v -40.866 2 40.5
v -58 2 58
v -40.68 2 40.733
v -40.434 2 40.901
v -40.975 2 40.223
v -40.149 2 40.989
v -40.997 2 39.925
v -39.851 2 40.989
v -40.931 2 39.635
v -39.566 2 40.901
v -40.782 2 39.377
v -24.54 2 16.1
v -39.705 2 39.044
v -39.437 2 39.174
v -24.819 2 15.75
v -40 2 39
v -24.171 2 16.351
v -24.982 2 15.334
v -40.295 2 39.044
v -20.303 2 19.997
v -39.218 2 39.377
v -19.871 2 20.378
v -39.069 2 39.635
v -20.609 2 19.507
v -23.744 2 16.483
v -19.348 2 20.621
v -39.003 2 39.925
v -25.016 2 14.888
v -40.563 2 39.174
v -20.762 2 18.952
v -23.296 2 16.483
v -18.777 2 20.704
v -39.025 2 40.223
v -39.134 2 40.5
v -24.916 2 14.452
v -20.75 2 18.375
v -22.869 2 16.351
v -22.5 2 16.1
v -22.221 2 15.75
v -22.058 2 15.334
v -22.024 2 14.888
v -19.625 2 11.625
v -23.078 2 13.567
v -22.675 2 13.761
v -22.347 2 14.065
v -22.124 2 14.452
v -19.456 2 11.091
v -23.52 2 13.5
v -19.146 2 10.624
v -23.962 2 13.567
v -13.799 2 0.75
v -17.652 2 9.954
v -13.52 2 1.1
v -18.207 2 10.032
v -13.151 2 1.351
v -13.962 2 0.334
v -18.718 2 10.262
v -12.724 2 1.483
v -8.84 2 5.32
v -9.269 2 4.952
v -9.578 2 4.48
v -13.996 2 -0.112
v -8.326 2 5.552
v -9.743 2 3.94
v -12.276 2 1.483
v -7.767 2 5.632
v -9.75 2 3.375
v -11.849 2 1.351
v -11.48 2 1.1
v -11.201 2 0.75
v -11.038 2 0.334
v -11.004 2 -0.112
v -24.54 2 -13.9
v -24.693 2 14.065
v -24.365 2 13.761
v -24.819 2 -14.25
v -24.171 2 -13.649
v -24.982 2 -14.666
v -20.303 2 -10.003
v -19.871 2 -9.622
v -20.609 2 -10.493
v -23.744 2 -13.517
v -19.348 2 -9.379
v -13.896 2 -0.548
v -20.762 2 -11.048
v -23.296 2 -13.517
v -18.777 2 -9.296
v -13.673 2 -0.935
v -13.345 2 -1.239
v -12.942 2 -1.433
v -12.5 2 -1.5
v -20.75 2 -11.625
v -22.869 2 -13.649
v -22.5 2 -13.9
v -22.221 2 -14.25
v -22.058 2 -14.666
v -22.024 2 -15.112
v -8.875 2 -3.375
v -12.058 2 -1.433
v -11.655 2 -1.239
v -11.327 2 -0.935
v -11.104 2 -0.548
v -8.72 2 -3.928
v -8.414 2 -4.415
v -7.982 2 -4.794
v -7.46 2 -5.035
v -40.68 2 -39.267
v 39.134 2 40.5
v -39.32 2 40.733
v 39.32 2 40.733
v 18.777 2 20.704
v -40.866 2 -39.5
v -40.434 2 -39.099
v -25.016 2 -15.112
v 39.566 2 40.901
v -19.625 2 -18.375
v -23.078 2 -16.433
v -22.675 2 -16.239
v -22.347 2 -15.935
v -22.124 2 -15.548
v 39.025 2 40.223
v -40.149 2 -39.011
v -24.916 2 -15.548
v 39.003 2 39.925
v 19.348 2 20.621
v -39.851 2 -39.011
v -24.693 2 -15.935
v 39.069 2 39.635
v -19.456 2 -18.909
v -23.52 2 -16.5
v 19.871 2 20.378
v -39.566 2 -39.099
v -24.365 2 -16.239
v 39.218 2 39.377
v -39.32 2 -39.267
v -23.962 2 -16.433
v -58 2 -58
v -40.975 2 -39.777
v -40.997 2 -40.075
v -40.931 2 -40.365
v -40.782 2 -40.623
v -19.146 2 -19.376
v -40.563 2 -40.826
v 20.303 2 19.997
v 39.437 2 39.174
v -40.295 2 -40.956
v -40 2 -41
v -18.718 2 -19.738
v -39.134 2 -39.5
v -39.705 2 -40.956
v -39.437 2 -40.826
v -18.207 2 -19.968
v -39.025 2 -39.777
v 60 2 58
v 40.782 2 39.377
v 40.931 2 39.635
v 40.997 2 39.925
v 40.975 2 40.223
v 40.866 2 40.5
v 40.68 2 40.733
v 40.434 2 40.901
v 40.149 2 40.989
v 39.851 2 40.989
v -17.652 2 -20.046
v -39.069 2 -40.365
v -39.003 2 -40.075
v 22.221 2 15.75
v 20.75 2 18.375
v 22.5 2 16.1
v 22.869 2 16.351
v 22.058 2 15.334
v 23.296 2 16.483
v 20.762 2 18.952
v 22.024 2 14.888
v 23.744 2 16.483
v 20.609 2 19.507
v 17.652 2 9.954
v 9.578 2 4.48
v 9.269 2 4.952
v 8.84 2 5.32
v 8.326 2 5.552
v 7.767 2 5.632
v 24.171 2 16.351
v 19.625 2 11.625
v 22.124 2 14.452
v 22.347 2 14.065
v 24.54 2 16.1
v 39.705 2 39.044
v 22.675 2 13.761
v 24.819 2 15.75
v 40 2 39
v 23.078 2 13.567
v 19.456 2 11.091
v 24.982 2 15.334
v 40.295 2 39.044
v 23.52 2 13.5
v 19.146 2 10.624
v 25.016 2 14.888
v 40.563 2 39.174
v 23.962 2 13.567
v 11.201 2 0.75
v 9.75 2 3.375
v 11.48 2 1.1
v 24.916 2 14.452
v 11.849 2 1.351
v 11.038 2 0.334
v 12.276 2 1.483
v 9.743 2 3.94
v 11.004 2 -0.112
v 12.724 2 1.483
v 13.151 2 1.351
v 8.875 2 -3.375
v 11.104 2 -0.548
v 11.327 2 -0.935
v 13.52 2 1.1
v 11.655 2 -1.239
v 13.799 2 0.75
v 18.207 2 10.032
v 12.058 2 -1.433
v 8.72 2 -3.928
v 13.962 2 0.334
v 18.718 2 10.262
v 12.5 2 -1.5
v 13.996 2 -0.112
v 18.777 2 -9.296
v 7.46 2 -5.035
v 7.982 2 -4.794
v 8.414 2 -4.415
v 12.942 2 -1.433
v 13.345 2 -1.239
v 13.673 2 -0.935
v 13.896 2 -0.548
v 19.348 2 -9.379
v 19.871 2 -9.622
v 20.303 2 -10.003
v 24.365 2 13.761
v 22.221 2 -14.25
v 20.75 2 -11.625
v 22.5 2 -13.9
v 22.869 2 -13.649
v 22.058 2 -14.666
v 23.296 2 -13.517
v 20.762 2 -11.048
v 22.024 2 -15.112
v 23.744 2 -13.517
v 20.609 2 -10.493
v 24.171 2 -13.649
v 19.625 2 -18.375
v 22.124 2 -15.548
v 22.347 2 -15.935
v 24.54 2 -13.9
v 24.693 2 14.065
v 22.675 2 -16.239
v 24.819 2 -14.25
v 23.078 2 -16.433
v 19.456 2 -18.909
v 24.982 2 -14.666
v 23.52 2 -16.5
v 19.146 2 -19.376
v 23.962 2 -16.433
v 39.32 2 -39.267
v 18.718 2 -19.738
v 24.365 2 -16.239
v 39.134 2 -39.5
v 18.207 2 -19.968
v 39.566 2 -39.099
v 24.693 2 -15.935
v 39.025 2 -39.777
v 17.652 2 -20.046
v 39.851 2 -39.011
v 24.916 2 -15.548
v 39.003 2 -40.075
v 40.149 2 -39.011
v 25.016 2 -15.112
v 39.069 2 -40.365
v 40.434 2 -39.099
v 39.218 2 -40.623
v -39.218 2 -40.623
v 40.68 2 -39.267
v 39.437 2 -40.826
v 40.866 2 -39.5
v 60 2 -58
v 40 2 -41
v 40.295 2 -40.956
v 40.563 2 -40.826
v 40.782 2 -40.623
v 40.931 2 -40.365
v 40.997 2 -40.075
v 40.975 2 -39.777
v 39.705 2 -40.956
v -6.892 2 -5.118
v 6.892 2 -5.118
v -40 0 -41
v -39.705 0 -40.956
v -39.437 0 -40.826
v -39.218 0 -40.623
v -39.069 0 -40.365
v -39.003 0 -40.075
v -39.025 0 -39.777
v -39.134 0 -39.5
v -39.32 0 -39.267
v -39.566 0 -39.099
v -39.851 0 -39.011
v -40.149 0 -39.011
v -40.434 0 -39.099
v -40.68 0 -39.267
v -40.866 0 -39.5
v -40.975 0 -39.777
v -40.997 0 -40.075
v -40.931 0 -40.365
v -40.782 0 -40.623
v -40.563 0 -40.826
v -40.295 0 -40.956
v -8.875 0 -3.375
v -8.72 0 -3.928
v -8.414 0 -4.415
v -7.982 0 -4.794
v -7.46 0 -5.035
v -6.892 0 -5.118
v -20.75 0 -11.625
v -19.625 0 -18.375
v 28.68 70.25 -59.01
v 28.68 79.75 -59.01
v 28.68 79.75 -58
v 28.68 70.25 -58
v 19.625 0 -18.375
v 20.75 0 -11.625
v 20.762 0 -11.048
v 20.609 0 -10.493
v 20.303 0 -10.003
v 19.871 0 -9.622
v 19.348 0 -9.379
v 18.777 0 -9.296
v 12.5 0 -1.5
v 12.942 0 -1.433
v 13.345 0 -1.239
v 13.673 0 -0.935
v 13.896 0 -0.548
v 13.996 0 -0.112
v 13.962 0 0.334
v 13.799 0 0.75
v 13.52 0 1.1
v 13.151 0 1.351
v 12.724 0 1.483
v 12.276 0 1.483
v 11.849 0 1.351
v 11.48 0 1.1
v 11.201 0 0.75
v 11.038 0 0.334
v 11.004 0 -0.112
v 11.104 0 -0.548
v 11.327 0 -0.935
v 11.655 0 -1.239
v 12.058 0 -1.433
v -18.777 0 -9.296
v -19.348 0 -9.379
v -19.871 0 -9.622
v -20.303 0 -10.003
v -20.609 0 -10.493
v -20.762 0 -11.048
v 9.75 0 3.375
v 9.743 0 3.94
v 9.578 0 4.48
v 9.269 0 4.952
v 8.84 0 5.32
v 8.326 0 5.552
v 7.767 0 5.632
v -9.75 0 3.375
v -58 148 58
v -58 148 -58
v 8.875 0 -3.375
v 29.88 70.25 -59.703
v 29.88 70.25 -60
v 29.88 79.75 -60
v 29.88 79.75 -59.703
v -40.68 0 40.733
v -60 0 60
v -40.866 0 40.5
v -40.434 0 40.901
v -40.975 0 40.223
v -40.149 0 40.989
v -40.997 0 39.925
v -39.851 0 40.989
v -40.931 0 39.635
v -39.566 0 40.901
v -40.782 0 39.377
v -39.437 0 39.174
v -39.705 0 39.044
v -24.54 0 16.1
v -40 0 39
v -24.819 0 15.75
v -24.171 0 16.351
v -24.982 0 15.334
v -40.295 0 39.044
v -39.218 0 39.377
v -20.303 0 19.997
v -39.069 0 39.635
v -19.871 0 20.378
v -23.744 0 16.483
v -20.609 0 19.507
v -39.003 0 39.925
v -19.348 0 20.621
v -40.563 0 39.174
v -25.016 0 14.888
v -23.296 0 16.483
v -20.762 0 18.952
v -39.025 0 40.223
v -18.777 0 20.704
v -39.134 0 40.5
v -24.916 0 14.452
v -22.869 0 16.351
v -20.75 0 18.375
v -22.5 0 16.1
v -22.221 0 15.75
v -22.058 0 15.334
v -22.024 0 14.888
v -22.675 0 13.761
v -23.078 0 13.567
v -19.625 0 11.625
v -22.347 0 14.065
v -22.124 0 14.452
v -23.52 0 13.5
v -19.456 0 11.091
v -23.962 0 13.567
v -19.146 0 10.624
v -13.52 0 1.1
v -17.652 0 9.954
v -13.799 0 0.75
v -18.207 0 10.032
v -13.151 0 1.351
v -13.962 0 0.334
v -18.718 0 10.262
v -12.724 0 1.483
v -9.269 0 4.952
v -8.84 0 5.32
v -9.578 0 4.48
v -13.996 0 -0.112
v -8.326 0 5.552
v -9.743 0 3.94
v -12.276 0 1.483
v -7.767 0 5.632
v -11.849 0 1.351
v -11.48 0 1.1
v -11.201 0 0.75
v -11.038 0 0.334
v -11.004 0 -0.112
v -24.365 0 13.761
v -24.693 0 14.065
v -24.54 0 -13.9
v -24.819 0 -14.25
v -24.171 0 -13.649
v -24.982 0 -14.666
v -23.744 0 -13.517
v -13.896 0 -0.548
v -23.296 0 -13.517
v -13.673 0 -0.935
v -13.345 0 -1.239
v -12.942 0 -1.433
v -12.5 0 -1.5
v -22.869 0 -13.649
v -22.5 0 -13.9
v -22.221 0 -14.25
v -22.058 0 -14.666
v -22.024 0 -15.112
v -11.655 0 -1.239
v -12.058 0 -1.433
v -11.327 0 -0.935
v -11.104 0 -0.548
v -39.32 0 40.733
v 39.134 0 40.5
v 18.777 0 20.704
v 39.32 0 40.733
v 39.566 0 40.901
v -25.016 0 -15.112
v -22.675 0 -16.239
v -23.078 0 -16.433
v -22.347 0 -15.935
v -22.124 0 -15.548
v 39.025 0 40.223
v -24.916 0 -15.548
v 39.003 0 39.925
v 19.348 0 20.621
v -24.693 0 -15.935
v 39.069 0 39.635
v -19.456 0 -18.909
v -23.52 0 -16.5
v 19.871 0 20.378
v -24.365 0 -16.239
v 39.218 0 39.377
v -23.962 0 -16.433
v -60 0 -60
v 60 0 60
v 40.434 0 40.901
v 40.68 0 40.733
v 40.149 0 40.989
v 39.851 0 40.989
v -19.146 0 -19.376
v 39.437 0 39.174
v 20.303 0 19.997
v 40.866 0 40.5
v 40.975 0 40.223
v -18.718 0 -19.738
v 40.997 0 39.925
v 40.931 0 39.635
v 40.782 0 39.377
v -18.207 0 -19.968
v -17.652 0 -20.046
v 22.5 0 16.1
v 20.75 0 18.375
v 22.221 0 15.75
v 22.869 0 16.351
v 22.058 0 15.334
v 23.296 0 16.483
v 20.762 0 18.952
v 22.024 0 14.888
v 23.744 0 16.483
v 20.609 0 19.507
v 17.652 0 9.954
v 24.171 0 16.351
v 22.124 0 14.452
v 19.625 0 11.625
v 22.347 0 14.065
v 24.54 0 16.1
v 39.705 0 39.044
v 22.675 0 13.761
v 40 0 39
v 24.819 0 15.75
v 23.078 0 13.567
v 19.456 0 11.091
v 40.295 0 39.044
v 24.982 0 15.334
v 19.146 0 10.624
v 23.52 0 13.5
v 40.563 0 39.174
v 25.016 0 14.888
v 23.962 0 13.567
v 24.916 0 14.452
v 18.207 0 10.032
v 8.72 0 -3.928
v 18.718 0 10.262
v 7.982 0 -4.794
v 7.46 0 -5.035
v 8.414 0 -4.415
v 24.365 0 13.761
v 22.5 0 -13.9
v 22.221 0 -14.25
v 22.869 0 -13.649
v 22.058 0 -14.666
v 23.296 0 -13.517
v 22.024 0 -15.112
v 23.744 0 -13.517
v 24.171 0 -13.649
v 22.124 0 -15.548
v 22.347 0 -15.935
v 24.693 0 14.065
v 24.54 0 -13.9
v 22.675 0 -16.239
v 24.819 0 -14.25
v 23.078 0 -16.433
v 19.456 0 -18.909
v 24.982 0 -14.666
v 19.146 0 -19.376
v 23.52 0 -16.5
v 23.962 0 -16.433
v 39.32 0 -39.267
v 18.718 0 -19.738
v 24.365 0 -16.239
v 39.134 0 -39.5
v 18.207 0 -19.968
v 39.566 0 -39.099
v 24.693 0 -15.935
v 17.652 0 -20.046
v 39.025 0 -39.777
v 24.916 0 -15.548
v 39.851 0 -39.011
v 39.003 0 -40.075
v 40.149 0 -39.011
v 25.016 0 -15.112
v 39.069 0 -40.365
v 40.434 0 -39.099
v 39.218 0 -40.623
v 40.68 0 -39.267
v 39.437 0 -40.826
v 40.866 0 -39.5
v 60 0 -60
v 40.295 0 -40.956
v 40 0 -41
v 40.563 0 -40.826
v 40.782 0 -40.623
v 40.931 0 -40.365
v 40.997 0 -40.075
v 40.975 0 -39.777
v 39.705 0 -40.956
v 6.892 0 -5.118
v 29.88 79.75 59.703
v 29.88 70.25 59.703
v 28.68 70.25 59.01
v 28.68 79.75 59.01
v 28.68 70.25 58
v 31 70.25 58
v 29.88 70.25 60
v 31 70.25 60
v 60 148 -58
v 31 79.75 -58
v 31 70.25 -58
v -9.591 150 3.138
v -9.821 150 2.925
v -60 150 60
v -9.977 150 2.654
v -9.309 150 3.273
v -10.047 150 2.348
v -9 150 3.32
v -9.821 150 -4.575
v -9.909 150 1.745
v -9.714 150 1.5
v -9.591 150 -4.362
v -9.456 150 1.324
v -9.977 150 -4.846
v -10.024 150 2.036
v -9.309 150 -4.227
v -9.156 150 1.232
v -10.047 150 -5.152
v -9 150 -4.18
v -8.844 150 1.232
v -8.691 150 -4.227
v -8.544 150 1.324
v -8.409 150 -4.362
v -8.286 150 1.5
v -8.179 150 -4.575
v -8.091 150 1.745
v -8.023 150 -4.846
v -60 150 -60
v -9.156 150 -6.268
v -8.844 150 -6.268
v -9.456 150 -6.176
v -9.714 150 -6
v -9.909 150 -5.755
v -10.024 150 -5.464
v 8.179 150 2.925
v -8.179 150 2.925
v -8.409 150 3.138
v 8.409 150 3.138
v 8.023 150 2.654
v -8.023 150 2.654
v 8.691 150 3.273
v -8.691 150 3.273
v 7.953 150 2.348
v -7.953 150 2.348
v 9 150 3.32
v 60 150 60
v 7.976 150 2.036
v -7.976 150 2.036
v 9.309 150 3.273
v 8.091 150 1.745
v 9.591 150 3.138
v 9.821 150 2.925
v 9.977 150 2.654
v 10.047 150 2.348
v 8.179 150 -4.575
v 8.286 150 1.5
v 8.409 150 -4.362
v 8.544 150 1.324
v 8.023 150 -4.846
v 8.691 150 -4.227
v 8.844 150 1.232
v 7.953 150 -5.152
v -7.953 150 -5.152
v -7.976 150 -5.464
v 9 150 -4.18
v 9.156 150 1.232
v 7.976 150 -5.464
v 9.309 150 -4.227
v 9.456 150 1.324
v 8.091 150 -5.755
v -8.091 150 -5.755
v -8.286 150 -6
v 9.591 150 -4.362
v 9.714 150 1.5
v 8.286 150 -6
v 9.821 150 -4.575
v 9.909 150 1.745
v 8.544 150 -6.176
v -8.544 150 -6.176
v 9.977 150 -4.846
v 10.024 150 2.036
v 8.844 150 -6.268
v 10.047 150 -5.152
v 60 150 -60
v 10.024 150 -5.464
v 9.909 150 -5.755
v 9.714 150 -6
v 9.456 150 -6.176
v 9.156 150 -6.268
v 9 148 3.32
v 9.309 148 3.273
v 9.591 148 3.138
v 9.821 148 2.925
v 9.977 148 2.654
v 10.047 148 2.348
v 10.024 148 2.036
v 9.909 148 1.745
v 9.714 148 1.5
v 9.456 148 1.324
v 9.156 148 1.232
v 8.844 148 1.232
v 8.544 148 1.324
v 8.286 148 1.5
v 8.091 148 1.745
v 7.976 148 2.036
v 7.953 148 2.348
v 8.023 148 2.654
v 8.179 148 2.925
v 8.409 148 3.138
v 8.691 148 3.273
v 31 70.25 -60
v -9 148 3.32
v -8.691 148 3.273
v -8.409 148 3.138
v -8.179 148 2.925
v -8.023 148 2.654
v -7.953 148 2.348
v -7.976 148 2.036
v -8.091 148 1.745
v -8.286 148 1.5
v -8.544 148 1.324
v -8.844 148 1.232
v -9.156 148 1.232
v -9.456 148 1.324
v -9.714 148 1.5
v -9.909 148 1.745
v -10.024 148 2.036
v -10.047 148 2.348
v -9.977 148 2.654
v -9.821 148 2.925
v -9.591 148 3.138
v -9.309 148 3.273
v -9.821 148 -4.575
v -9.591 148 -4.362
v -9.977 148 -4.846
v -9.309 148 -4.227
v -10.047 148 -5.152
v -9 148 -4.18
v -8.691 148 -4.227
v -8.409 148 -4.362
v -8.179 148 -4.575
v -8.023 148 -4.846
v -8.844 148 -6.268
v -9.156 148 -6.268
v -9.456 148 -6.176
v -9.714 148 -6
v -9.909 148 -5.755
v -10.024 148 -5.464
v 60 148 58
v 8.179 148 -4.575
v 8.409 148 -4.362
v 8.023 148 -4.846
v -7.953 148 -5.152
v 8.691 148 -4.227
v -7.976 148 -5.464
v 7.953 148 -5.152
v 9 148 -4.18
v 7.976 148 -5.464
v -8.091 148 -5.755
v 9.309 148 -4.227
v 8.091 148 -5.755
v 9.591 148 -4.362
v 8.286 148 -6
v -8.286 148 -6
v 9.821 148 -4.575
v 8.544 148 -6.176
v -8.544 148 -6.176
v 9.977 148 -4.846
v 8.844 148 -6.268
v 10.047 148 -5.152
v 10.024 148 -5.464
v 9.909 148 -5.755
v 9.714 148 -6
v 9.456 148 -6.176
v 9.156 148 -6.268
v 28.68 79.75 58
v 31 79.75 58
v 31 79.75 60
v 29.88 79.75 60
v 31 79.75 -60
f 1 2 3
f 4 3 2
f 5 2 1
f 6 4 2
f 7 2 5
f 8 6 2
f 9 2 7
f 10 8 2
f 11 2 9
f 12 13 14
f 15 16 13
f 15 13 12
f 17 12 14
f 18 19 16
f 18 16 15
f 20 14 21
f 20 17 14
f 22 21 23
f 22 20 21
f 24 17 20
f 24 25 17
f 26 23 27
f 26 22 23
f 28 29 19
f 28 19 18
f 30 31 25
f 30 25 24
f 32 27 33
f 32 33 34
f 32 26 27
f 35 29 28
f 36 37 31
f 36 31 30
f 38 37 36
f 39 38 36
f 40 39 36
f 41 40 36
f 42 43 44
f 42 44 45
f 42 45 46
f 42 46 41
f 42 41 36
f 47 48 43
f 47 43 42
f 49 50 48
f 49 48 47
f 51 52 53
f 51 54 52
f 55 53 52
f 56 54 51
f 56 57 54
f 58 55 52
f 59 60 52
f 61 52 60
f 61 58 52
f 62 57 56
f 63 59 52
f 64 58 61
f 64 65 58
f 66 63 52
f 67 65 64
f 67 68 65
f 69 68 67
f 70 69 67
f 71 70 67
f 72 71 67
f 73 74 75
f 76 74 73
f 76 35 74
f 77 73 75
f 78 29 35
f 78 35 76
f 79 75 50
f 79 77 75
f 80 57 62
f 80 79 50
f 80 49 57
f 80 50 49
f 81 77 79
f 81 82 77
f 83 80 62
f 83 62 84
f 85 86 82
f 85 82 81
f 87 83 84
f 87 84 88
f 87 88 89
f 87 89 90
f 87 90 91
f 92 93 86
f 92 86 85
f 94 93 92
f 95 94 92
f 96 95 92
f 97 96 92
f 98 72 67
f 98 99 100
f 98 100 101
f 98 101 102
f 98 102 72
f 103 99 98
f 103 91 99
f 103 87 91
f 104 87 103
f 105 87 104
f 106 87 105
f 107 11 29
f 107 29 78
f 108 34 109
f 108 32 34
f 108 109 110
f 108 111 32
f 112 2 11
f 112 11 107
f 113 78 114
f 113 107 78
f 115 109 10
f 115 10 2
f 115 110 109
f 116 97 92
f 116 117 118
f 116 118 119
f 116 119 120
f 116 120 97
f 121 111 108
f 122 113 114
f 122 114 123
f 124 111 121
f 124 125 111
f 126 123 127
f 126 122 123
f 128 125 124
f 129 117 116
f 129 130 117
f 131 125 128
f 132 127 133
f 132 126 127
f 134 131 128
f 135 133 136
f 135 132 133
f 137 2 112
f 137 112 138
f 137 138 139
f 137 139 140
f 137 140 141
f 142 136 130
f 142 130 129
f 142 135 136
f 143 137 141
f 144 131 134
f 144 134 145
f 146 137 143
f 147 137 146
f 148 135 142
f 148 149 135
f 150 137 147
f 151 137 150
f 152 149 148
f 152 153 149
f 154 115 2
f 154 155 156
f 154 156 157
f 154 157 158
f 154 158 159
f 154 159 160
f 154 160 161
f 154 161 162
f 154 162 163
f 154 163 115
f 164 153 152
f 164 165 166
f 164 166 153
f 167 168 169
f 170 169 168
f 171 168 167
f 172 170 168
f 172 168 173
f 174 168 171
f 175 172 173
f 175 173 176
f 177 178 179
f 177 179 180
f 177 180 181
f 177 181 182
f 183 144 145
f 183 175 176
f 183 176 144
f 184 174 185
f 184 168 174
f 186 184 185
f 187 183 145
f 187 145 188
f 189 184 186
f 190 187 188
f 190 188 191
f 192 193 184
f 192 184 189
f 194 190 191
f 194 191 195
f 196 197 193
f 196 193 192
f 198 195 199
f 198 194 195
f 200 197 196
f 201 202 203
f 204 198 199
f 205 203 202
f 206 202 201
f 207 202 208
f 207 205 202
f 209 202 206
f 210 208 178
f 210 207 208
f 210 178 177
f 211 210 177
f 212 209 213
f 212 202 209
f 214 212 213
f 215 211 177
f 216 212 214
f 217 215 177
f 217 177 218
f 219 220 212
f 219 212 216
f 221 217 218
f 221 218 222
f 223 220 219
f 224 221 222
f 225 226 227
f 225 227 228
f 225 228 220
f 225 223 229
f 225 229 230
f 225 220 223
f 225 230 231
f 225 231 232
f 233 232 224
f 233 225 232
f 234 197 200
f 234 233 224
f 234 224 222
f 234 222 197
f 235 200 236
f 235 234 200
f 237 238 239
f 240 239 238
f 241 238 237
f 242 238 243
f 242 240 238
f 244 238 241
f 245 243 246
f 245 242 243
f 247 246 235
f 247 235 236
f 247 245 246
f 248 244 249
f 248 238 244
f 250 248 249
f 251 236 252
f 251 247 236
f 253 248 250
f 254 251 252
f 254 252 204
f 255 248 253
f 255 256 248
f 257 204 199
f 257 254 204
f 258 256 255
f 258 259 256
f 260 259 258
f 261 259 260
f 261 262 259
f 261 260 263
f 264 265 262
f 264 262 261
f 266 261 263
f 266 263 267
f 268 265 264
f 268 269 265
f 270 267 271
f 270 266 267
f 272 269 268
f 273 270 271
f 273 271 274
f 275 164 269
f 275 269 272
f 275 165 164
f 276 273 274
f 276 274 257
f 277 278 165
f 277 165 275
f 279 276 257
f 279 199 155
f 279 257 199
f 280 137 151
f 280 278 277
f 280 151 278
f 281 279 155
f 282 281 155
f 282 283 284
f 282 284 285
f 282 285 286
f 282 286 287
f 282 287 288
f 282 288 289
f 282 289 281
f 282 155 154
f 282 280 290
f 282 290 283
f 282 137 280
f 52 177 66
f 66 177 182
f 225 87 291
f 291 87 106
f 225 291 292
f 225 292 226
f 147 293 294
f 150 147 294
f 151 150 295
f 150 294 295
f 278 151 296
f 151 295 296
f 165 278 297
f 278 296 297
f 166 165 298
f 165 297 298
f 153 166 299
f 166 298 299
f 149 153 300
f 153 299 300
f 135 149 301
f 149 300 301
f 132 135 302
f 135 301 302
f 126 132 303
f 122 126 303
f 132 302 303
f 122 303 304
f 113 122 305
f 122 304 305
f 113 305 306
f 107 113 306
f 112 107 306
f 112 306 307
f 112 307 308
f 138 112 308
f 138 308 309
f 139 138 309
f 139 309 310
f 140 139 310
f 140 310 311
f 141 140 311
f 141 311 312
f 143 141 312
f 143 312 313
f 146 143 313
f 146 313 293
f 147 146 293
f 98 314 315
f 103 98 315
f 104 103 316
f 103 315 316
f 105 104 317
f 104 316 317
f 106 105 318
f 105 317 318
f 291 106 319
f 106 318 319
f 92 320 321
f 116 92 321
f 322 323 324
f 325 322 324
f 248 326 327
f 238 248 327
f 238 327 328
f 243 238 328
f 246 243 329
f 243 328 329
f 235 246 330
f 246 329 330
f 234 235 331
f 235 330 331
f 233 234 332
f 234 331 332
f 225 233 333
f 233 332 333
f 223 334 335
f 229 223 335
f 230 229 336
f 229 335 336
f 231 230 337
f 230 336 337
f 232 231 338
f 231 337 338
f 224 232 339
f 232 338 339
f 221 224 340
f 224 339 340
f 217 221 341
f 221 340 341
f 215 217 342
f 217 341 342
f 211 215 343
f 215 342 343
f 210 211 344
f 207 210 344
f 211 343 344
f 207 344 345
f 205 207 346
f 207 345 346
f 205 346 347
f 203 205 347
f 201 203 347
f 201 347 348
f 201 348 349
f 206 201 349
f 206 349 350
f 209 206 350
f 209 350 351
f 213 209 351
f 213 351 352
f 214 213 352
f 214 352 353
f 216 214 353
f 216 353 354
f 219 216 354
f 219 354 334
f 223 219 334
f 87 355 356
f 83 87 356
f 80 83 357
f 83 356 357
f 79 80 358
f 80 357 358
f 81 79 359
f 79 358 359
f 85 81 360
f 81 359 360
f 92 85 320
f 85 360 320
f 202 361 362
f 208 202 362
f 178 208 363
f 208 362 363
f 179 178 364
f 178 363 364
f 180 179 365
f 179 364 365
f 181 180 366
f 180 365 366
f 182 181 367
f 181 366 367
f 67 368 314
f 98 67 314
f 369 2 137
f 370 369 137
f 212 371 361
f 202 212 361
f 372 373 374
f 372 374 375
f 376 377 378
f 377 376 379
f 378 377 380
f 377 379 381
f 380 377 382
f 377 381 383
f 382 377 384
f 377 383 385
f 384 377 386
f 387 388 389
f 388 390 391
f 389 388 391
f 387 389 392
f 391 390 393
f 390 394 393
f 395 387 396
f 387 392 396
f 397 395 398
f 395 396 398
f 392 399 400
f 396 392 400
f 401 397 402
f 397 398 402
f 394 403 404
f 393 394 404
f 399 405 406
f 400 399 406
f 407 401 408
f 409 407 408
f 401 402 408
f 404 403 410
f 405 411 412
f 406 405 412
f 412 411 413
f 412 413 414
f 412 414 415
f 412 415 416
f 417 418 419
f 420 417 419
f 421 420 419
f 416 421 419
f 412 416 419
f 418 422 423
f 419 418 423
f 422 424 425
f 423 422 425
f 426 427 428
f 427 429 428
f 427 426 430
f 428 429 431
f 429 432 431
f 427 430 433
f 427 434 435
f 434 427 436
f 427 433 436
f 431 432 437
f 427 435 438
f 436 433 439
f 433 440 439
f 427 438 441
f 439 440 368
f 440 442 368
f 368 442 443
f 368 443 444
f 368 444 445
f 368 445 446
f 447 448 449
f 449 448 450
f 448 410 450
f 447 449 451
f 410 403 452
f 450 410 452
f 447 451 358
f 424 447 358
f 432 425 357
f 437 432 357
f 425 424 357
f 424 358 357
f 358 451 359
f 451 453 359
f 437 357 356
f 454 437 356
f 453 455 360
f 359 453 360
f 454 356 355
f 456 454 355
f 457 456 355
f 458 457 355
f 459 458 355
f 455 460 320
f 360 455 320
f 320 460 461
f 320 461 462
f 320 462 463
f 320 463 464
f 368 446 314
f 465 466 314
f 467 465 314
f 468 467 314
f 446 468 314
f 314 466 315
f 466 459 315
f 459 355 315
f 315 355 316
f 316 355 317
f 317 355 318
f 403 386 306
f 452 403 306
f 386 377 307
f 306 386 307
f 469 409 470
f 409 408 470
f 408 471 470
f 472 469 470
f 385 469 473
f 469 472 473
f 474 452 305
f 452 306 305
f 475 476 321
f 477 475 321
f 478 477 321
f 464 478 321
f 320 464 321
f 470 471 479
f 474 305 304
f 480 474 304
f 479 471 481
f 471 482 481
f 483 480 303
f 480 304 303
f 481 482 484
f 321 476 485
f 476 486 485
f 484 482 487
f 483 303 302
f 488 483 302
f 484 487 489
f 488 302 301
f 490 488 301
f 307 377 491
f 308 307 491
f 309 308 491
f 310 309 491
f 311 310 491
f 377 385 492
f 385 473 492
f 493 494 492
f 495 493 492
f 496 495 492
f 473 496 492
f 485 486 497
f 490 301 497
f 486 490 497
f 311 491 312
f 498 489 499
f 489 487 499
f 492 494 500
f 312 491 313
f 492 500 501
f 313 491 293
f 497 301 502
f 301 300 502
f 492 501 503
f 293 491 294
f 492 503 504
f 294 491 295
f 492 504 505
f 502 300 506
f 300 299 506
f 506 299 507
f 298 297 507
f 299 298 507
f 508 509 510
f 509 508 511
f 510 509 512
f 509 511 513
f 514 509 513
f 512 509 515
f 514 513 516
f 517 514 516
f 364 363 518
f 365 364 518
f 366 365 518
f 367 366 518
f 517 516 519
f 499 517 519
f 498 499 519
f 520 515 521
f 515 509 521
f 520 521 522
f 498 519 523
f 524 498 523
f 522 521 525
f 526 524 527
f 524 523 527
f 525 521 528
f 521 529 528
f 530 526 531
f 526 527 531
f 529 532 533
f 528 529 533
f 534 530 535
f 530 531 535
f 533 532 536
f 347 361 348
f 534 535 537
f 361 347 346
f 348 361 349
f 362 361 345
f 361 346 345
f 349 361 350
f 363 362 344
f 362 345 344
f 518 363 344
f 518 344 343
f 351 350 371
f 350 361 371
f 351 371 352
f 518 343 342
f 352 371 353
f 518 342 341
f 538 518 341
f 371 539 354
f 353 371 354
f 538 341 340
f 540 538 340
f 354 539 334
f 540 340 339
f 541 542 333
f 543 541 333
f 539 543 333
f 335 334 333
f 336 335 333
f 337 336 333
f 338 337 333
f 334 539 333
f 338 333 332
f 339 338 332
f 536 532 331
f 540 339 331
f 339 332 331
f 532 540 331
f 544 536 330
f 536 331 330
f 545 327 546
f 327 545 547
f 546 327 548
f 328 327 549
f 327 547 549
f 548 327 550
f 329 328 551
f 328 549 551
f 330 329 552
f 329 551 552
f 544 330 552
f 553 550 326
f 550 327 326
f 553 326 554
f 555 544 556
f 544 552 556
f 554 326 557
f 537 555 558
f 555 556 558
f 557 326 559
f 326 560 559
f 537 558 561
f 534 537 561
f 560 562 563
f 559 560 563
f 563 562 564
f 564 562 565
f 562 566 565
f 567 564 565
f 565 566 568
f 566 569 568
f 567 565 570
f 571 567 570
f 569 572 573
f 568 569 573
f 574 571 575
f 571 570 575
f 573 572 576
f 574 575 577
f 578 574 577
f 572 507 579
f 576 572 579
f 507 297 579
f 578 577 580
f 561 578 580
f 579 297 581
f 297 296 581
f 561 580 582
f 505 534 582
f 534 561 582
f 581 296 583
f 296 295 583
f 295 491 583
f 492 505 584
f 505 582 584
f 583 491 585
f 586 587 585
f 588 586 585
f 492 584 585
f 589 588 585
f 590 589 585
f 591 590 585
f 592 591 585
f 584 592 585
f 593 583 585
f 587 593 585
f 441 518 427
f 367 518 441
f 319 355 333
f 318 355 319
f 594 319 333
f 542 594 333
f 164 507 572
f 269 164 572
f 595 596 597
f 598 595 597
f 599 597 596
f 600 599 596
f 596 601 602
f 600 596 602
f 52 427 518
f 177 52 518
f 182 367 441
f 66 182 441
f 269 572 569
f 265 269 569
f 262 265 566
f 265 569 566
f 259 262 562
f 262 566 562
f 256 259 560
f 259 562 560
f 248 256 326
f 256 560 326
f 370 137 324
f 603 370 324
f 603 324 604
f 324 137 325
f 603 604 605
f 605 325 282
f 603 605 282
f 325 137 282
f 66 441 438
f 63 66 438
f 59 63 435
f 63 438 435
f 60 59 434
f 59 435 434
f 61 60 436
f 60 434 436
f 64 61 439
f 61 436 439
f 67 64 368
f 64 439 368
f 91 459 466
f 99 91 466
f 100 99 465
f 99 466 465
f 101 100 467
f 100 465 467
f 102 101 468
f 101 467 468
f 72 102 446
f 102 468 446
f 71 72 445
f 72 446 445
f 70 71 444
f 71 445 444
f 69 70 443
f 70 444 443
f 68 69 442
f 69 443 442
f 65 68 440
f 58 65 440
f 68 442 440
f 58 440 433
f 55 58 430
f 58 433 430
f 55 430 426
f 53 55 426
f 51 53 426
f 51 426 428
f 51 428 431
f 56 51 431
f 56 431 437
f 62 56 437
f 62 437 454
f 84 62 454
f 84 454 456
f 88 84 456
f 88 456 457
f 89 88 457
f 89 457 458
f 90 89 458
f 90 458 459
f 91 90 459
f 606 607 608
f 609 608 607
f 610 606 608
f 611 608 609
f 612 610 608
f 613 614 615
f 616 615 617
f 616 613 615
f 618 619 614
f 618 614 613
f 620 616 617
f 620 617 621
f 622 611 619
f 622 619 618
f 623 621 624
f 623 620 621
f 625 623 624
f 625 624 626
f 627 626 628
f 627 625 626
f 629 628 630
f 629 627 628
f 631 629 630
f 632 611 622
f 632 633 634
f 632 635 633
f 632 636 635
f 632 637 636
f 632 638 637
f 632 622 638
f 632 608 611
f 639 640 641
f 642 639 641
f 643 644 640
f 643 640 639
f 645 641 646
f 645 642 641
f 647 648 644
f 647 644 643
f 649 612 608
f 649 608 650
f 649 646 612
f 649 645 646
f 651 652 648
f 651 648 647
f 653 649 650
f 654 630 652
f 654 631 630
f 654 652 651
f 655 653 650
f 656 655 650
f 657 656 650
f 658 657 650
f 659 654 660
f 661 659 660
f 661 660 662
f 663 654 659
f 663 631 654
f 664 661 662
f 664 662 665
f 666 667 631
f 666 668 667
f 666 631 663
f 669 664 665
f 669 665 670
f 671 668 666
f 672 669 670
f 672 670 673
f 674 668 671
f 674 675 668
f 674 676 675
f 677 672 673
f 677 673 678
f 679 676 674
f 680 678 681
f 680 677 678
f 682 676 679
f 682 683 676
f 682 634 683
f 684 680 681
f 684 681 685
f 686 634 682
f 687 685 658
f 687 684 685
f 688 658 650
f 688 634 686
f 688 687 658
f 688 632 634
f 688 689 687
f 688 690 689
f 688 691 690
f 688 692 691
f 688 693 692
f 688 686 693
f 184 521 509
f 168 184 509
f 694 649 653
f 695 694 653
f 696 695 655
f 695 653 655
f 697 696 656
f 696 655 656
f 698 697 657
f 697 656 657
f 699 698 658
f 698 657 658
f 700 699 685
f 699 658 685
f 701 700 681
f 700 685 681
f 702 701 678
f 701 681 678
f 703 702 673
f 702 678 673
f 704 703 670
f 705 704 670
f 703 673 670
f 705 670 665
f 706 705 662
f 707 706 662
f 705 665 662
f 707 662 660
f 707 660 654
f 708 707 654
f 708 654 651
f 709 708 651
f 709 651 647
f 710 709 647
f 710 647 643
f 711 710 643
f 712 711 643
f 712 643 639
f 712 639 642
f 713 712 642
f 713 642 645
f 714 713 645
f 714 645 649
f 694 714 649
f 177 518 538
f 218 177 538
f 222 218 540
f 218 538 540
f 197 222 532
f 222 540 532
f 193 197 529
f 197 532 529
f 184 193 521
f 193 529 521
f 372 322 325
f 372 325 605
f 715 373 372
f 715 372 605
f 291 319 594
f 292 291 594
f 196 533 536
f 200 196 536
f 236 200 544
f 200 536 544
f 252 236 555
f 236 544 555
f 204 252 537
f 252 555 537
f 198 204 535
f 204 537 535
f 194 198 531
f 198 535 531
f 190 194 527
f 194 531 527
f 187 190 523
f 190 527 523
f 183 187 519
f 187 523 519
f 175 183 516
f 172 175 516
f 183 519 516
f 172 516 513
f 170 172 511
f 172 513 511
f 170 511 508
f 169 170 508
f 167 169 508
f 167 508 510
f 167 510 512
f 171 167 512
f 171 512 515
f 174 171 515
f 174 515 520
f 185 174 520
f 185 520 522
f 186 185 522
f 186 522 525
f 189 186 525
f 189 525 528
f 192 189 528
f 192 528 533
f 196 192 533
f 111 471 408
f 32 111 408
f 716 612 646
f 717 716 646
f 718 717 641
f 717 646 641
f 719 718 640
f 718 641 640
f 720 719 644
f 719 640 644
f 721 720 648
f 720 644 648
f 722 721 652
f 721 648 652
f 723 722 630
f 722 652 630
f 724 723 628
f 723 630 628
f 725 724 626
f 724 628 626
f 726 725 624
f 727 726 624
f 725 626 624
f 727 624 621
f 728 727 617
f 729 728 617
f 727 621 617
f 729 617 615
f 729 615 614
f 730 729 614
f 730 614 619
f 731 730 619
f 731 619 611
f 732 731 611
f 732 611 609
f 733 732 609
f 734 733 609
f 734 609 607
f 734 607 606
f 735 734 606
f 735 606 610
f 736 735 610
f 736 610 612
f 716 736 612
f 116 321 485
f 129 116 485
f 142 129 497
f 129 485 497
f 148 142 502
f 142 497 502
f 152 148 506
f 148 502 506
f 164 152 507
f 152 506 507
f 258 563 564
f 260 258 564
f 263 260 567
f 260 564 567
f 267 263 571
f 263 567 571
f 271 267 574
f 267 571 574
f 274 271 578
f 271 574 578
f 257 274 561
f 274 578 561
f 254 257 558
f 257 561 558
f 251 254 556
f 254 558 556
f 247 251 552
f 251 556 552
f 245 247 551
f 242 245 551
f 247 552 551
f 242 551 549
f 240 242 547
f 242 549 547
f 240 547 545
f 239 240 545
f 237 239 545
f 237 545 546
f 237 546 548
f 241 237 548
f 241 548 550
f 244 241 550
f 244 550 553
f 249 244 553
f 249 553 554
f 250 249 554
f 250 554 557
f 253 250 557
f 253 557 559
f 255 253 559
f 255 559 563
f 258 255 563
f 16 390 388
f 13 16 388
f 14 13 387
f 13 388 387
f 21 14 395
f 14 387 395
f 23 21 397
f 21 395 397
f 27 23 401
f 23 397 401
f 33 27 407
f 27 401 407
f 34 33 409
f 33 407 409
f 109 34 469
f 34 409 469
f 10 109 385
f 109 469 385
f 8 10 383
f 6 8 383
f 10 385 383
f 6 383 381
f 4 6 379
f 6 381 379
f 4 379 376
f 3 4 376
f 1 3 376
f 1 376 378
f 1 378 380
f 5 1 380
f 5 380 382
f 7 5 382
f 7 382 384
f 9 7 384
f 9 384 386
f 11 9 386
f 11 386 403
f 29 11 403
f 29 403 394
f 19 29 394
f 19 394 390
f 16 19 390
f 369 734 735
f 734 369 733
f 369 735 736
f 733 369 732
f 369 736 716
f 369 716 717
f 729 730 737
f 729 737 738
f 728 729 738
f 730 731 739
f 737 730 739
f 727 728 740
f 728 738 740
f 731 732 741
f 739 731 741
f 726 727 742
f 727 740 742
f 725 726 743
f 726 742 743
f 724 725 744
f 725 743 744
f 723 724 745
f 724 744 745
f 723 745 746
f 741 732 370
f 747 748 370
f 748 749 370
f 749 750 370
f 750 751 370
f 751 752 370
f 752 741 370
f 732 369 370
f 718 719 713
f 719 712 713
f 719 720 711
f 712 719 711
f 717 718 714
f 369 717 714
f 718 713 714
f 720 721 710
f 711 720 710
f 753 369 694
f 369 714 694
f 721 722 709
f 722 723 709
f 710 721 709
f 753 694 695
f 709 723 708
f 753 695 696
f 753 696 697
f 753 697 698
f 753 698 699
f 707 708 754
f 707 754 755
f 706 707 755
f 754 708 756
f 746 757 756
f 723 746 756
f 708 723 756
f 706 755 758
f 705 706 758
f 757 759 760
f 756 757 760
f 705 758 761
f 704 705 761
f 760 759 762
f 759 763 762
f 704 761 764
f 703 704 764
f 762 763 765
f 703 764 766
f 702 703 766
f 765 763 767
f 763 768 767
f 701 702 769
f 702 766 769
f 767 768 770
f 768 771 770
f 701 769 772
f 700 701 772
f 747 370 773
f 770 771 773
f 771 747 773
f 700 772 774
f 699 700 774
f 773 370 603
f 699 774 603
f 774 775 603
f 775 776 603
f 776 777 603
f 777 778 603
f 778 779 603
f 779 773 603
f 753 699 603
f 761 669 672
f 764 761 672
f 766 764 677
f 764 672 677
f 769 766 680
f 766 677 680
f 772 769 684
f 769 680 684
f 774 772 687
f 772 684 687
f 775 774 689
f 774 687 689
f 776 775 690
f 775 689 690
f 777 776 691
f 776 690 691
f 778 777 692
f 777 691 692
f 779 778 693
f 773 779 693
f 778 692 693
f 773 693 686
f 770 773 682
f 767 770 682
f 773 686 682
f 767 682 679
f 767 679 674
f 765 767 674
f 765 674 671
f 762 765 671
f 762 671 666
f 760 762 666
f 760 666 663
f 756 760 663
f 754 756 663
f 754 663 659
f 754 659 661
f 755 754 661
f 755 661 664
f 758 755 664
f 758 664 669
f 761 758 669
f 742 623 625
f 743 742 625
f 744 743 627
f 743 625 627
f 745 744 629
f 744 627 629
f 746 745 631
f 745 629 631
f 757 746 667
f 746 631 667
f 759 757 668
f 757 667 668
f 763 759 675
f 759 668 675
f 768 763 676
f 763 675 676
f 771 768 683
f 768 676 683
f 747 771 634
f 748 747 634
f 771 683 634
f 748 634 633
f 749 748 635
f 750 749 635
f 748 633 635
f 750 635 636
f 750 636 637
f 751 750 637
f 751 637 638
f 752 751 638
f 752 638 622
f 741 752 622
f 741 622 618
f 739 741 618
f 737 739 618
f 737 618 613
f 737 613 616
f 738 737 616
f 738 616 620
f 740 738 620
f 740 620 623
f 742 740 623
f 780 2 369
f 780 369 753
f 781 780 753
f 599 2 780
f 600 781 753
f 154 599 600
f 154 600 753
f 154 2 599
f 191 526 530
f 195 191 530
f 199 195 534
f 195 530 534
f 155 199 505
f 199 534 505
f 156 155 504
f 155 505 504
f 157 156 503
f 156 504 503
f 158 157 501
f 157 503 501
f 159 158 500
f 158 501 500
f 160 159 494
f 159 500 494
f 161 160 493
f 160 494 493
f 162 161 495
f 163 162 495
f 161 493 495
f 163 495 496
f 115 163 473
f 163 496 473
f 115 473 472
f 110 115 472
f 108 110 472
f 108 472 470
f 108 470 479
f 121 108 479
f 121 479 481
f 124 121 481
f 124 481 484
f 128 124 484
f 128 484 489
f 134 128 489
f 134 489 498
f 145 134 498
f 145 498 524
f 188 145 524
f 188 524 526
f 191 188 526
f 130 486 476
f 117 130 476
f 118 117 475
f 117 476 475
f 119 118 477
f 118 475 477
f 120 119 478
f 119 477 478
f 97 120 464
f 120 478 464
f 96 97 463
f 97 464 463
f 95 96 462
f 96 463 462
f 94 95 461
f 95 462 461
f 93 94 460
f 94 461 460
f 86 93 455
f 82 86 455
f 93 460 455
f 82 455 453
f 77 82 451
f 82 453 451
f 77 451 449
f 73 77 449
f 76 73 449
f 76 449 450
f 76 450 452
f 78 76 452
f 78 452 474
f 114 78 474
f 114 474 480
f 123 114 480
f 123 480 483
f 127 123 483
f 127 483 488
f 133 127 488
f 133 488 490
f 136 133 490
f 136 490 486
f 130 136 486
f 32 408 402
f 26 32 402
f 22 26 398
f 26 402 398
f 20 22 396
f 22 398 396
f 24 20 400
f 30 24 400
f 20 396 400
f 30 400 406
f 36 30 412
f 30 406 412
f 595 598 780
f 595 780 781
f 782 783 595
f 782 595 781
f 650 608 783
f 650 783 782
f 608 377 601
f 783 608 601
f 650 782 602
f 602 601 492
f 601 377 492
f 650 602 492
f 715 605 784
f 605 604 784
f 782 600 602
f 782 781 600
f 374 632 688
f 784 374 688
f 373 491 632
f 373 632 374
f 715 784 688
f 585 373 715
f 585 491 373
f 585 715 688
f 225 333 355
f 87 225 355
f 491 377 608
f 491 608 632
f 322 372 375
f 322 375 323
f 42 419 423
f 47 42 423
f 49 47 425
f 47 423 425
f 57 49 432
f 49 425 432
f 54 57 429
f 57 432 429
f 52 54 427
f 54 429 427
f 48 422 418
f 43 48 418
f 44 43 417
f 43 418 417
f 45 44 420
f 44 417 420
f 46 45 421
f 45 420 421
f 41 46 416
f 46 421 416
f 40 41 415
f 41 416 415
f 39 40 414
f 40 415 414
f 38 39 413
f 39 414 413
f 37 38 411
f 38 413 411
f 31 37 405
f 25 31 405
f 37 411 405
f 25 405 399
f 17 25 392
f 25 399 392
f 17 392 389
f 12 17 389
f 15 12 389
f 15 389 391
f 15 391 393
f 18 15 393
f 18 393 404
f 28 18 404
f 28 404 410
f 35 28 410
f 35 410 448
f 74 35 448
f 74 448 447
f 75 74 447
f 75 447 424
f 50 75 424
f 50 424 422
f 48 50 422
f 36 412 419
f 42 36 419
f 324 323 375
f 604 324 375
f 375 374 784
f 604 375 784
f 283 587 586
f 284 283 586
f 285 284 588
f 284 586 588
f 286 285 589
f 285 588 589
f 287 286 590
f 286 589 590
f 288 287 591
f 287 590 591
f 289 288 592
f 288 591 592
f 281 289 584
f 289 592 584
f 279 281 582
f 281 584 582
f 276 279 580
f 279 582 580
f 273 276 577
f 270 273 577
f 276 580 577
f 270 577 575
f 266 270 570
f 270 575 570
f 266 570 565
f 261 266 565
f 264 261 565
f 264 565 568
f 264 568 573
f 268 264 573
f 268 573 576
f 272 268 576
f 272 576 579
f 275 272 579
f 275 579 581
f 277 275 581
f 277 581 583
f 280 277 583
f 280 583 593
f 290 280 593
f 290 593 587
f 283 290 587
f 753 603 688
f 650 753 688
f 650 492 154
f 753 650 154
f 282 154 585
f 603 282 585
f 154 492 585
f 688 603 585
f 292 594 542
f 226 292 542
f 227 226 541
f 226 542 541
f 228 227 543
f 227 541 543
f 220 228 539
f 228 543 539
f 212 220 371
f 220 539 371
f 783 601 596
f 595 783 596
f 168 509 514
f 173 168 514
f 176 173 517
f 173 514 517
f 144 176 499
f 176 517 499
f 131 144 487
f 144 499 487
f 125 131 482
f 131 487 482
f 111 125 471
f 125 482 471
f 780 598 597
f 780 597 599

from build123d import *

# Parameters (mm, degrees)
SKETCH1_W             = 120
SKETCH1_H             = 120
MAIN_BODY_DEPTH       = 150
HOLLOW_INSIDE_T       = -2
MAIN_PCB_HOLES_REACH  = 174.337
SKETCH2_R             = 1
LED_PCB_HOLES_REACH   = 174.337
SKETCH3_R             = 1.05
CONNECTOR_SLOTS_REACH = 174.337
SKETCH4_R             = 1.5
CUT_EXTRUDE1_DEPTH    = 4.75


with BuildPart() as part:
    # Sketch1 → Main-Body (new body)
    with BuildSketch(Plane(origin=(0, 0, 0), x_dir=(1, 0, 0), z_dir=(0, 1, 0))):
        Rectangle(SKETCH1_W, SKETCH1_H)
    extrude(amount=MAIN_BODY_DEPTH)

    # Hollow-Inside
    hollow_inside_openings = [part.faces().sort_by_distance(p)[0] for p in [
        (60, 75, 0),
    ]]
    offset(amount=HOLLOW_INSIDE_T, openings=hollow_inside_openings, kind=Kind.INTERSECTION)

    # Sketch2 → Main-PCB-Holes (cut, up to next)
    with BuildSketch(Plane.XZ, mode=Mode.PRIVATE) as main_pcb_holes_sk1:
        with Locations(Location((-40, 40, 0), (0, 0, 270))):
            Circle(SKETCH2_R)
    main_pcb_holes_tool1 = extrude(main_pcb_holes_sk1.sketch, amount=-MAIN_PCB_HOLES_REACH, mode=Mode.PRIVATE) & part.part
    # Sketch2 → Main-PCB-Holes (cut, up to next)
    with BuildSketch(Plane.XZ, mode=Mode.PRIVATE) as main_pcb_holes_sk2:
        with Locations(Location((40, 40, 0), (0, 0, 270))):
            Circle(SKETCH2_R)
    main_pcb_holes_tool2 = extrude(main_pcb_holes_sk2.sketch, amount=-MAIN_PCB_HOLES_REACH, mode=Mode.PRIVATE) & part.part
    # Sketch2 → Main-PCB-Holes (cut, up to next)
    with BuildSketch(Plane.XZ, mode=Mode.PRIVATE) as main_pcb_holes_sk3:
        with Locations(Location((40, -40, 0), (0, 0, 270))):
            Circle(SKETCH2_R)
    main_pcb_holes_tool3 = extrude(main_pcb_holes_sk3.sketch, amount=-MAIN_PCB_HOLES_REACH, mode=Mode.PRIVATE) & part.part
    # Sketch2 → Main-PCB-Holes (cut, up to next)
    with BuildSketch(Plane.XZ, mode=Mode.PRIVATE) as main_pcb_holes_sk4:
        with Locations(Location((-40, -40, 0), (0, 0, 270))):
            Circle(SKETCH2_R)
    main_pcb_holes_tool4 = extrude(main_pcb_holes_sk4.sketch, amount=-MAIN_PCB_HOLES_REACH, mode=Mode.PRIVATE) & part.part
    add(main_pcb_holes_tool1.solids().sort_by_distance((-40, 0, 40))[0], mode=Mode.SUBTRACT)
    add(main_pcb_holes_tool2.solids().sort_by_distance((40, 0, 40))[0], mode=Mode.SUBTRACT)
    add(main_pcb_holes_tool3.solids().sort_by_distance((40, 0, -40))[0], mode=Mode.SUBTRACT)
    add(main_pcb_holes_tool4.solids().sort_by_distance((-40, 0, -40))[0], mode=Mode.SUBTRACT)

    # Sketch3 → LED-PCB-Holes (cut, up to next)
    with BuildSketch(Plane(origin=(0, 150, 0), x_dir=(1, 0, 0), z_dir=(0, 1, 0)), mode=Mode.PRIVATE) as led_pcb_holes_sk1:
        with Locations(Location((-9, 5.23, 0), (0, 0, 270))):
            Circle(SKETCH3_R)
    led_pcb_holes_tool1 = extrude(led_pcb_holes_sk1.sketch, amount=-LED_PCB_HOLES_REACH, mode=Mode.PRIVATE) & part.part
    # Sketch3 → LED-PCB-Holes (cut, up to next)
    with BuildSketch(Plane(origin=(0, 150, 0), x_dir=(1, 0, 0), z_dir=(0, 1, 0)), mode=Mode.PRIVATE) as led_pcb_holes_sk2:
        with Locations(Location((9, 5.23, 0), (0, 0, 270))):
            Circle(SKETCH3_R)
    led_pcb_holes_tool2 = extrude(led_pcb_holes_sk2.sketch, amount=-LED_PCB_HOLES_REACH, mode=Mode.PRIVATE) & part.part
    # Sketch3 → LED-PCB-Holes (cut, up to next)
    with BuildSketch(Plane(origin=(0, 150, 0), x_dir=(1, 0, 0), z_dir=(0, 1, 0)), mode=Mode.PRIVATE) as led_pcb_holes_sk3:
        with Locations(Location((9, -2.27, 0), (0, 0, 270))):
            Circle(SKETCH3_R)
    led_pcb_holes_tool3 = extrude(led_pcb_holes_sk3.sketch, amount=-LED_PCB_HOLES_REACH, mode=Mode.PRIVATE) & part.part
    # Sketch3 → LED-PCB-Holes (cut, up to next)
    with BuildSketch(Plane(origin=(0, 150, 0), x_dir=(1, 0, 0), z_dir=(0, 1, 0)), mode=Mode.PRIVATE) as led_pcb_holes_sk4:
        with Locations(Location((-9, -2.27, 0), (0, 0, 270))):
            Circle(SKETCH3_R)
    led_pcb_holes_tool4 = extrude(led_pcb_holes_sk4.sketch, amount=-LED_PCB_HOLES_REACH, mode=Mode.PRIVATE) & part.part
    add(led_pcb_holes_tool1.solids().sort_by_distance((-9, 150, -5.23))[0], mode=Mode.SUBTRACT)
    add(led_pcb_holes_tool2.solids().sort_by_distance((9, 150, -5.23))[0], mode=Mode.SUBTRACT)
    add(led_pcb_holes_tool3.solids().sort_by_distance((9, 150, 2.27))[0], mode=Mode.SUBTRACT)
    add(led_pcb_holes_tool4.solids().sort_by_distance((-9, 150, 2.27))[0], mode=Mode.SUBTRACT)

    # Sketch4 → Connector-Slots (cut, up to next)
    with BuildSketch(Plane.XZ, mode=Mode.PRIVATE) as connector_slots_sk1:
        with Locations(Location((-12.5, 0, 0), (0, 0, 270))):
            Circle(SKETCH4_R)
    connector_slots_tool1 = extrude(connector_slots_sk1.sketch, amount=-CONNECTOR_SLOTS_REACH, mode=Mode.PRIVATE) & part.part
    # Sketch4 → Connector-Slots (cut, up to next)
    with BuildSketch(Plane.XZ, mode=Mode.PRIVATE) as connector_slots_sk2:
        with Locations(Location((12.5, 0, 0), (0, 0, 270))):
            Circle(SKETCH4_R)
    connector_slots_tool2 = extrude(connector_slots_sk2.sketch, amount=-CONNECTOR_SLOTS_REACH, mode=Mode.PRIVATE) & part.part
    # Sketch4 → Connector-Slots (cut, up to next)
    with BuildSketch(Plane.XZ, mode=Mode.PRIVATE) as connector_slots_sk3:
        with Locations(Location((-23.52, -15, 0), (0, 0, 270))):
            Circle(SKETCH4_R)
    connector_slots_tool3 = extrude(connector_slots_sk3.sketch, amount=-CONNECTOR_SLOTS_REACH, mode=Mode.PRIVATE) & part.part
    # Sketch4 → Connector-Slots (cut, up to next)
    with BuildSketch(Plane.XZ, mode=Mode.PRIVATE) as connector_slots_sk4:
        with Locations(Location((23.52, -15, 0), (0, 0, 270))):
            Circle(SKETCH4_R)
    connector_slots_tool4 = extrude(connector_slots_sk4.sketch, amount=-CONNECTOR_SLOTS_REACH, mode=Mode.PRIVATE) & part.part
    # Sketch4 → Connector-Slots (cut, up to next)
    with BuildSketch(Plane.XZ, mode=Mode.PRIVATE) as connector_slots_sk5:
        with Locations(Location((-23.52, 15, 0), (0, 0, 270))):
            Circle(SKETCH4_R)
    connector_slots_tool5 = extrude(connector_slots_sk5.sketch, amount=-CONNECTOR_SLOTS_REACH, mode=Mode.PRIVATE) & part.part
    # Sketch4 → Connector-Slots (cut, up to next)
    with BuildSketch(Plane.XZ, mode=Mode.PRIVATE) as connector_slots_sk6:
        with Locations(Location((23.52, 15, 0), (0, 0, 270))):
            Circle(SKETCH4_R)
    connector_slots_tool6 = extrude(connector_slots_sk6.sketch, amount=-CONNECTOR_SLOTS_REACH, mode=Mode.PRIVATE) & part.part
    # Sketch4 → Connector-Slots (cut, up to next)
    with BuildSketch(Plane.XZ, mode=Mode.PRIVATE) as connector_slots_sk7:
        with BuildLine():
            Line((-6.891594987, -5.117891943), (6.891594987, -5.117891943))
            ThreePointArc((6.891594987, -5.117891943), (8.211781315, -4.620259427), (8.875, -3.375))
            Line((8.875, -3.375), (9.75, 3.375))
            ThreePointArc((9.75, 3.375), (9.268962471, 4.952294386), (7.766594987, 5.632108057))
            Line((7.766594987, 5.632108057), (-7.766594987, 5.632108057))
            ThreePointArc((-7.766594987, 5.632108057), (-9.268962471, 4.952294386), (-9.75, 3.375))
            Line((-9.75, 3.375), (-8.875, -3.375))
            ThreePointArc((-8.875, -3.375), (-8.211781315, -4.620259427), (-6.891594987, -5.117891943))
        make_face()
    connector_slots_tool7 = extrude(connector_slots_sk7.sketch, amount=-CONNECTOR_SLOTS_REACH, mode=Mode.PRIVATE) & part.part
    # Sketch4 → Connector-Slots (cut, up to next)
    with BuildSketch(Plane.XZ, mode=Mode.PRIVATE) as connector_slots_sk8:
        with BuildLine():
            Line((-17.652212152, -20.046202025), (17.652212152, -20.046202025))
            ThreePointArc((17.652212152, -20.046202025), (18.944961945, -19.57224199), (19.625, -18.375))
            Line((19.625, -18.375), (20.75, -11.625))
            ThreePointArc((20.75, -11.625), (20.303252117, -10.003452233), (18.777212152, -9.296202025))
            Line((18.777212152, -9.296202025), (-18.777212152, -9.296202025))
            ThreePointArc((-18.777212152, -9.296202025), (-20.303252117, -10.003452233), (-20.75, -11.625))
            Line((-20.75, -11.625), (-19.625, -18.375))
            ThreePointArc((-19.625, -18.375), (-18.944961945, -19.57224199), (-17.652212152, -20.046202025))
        make_face()
    connector_slots_tool8 = extrude(connector_slots_sk8.sketch, amount=-CONNECTOR_SLOTS_REACH, mode=Mode.PRIVATE) & part.part
    # Sketch4 → Connector-Slots (cut, up to next)
    with BuildSketch(Plane.XZ, mode=Mode.PRIVATE) as connector_slots_sk9:
        with BuildLine():
            Line((-17.652212152, 9.953797975), (17.652212152, 9.953797975))
            ThreePointArc((17.652212152, 9.953797975), (18.944961945, 10.42775801), (19.625, 11.625))
            Line((19.625, 11.625), (20.75, 18.375))
            ThreePointArc((20.75, 18.375), (20.303252117, 19.996547767), (18.777212152, 20.703797975))
            Line((18.777212152, 20.703797975), (-18.777212152, 20.703797975))
            ThreePointArc((-18.777212152, 20.703797975), (-20.303252117, 19.996547767), (-20.75, 18.375))
            Line((-20.75, 18.375), (-19.625, 11.625))
            ThreePointArc((-19.625, 11.625), (-18.944961945, 10.42775801), (-17.652212152, 9.953797975))
        make_face()
    connector_slots_tool9 = extrude(connector_slots_sk9.sketch, amount=-CONNECTOR_SLOTS_REACH, mode=Mode.PRIVATE) & part.part
    add(connector_slots_tool1.solids().sort_by_distance((-12.5, 0, 0))[0], mode=Mode.SUBTRACT)
    add(connector_slots_tool2.solids().sort_by_distance((12.5, 0, 0))[0], mode=Mode.SUBTRACT)
    add(connector_slots_tool3.solids().sort_by_distance((-23.52, 0, -15))[0], mode=Mode.SUBTRACT)
    add(connector_slots_tool4.solids().sort_by_distance((23.52, 0, -15))[0], mode=Mode.SUBTRACT)
    add(connector_slots_tool5.solids().sort_by_distance((-23.52, 0, 15))[0], mode=Mode.SUBTRACT)
    add(connector_slots_tool6.solids().sort_by_distance((23.52, 0, 15))[0], mode=Mode.SUBTRACT)
    add(connector_slots_tool7.solids().sort_by_distance((0, 0, 0.368259))[0], mode=Mode.SUBTRACT)
    add(connector_slots_tool8.solids().sort_by_distance((0, 0, -14.605881))[0], mode=Mode.SUBTRACT)
    add(connector_slots_tool9.solids().sort_by_distance((0, 0, 15.394119))[0], mode=Mode.SUBTRACT)

    # Sketch12 → Cut-Extrude1 (cut, symmetric)
    with BuildSketch(Plane(origin=(0, 75, 0), x_dir=(1, 0, 0), z_dir=(0, 1, 0))):
        Polygon((30.88, 60), (29.88, 60), (29.88, 59.702820323), (28.68, 59.01), (28.68, 58), (30.88, 58), (31, 58), (31, 60), align=None)
    cut_extrude1 = extrude(amount=CUT_EXTRUDE1_DEPTH, both=True, mode=Mode.SUBTRACT)

    # Mirror1: Cut-Extrude1 across plane
    add(cut_extrude1.mirror(Plane.XY), mode=Mode.SUBTRACT)


solid = part.part
